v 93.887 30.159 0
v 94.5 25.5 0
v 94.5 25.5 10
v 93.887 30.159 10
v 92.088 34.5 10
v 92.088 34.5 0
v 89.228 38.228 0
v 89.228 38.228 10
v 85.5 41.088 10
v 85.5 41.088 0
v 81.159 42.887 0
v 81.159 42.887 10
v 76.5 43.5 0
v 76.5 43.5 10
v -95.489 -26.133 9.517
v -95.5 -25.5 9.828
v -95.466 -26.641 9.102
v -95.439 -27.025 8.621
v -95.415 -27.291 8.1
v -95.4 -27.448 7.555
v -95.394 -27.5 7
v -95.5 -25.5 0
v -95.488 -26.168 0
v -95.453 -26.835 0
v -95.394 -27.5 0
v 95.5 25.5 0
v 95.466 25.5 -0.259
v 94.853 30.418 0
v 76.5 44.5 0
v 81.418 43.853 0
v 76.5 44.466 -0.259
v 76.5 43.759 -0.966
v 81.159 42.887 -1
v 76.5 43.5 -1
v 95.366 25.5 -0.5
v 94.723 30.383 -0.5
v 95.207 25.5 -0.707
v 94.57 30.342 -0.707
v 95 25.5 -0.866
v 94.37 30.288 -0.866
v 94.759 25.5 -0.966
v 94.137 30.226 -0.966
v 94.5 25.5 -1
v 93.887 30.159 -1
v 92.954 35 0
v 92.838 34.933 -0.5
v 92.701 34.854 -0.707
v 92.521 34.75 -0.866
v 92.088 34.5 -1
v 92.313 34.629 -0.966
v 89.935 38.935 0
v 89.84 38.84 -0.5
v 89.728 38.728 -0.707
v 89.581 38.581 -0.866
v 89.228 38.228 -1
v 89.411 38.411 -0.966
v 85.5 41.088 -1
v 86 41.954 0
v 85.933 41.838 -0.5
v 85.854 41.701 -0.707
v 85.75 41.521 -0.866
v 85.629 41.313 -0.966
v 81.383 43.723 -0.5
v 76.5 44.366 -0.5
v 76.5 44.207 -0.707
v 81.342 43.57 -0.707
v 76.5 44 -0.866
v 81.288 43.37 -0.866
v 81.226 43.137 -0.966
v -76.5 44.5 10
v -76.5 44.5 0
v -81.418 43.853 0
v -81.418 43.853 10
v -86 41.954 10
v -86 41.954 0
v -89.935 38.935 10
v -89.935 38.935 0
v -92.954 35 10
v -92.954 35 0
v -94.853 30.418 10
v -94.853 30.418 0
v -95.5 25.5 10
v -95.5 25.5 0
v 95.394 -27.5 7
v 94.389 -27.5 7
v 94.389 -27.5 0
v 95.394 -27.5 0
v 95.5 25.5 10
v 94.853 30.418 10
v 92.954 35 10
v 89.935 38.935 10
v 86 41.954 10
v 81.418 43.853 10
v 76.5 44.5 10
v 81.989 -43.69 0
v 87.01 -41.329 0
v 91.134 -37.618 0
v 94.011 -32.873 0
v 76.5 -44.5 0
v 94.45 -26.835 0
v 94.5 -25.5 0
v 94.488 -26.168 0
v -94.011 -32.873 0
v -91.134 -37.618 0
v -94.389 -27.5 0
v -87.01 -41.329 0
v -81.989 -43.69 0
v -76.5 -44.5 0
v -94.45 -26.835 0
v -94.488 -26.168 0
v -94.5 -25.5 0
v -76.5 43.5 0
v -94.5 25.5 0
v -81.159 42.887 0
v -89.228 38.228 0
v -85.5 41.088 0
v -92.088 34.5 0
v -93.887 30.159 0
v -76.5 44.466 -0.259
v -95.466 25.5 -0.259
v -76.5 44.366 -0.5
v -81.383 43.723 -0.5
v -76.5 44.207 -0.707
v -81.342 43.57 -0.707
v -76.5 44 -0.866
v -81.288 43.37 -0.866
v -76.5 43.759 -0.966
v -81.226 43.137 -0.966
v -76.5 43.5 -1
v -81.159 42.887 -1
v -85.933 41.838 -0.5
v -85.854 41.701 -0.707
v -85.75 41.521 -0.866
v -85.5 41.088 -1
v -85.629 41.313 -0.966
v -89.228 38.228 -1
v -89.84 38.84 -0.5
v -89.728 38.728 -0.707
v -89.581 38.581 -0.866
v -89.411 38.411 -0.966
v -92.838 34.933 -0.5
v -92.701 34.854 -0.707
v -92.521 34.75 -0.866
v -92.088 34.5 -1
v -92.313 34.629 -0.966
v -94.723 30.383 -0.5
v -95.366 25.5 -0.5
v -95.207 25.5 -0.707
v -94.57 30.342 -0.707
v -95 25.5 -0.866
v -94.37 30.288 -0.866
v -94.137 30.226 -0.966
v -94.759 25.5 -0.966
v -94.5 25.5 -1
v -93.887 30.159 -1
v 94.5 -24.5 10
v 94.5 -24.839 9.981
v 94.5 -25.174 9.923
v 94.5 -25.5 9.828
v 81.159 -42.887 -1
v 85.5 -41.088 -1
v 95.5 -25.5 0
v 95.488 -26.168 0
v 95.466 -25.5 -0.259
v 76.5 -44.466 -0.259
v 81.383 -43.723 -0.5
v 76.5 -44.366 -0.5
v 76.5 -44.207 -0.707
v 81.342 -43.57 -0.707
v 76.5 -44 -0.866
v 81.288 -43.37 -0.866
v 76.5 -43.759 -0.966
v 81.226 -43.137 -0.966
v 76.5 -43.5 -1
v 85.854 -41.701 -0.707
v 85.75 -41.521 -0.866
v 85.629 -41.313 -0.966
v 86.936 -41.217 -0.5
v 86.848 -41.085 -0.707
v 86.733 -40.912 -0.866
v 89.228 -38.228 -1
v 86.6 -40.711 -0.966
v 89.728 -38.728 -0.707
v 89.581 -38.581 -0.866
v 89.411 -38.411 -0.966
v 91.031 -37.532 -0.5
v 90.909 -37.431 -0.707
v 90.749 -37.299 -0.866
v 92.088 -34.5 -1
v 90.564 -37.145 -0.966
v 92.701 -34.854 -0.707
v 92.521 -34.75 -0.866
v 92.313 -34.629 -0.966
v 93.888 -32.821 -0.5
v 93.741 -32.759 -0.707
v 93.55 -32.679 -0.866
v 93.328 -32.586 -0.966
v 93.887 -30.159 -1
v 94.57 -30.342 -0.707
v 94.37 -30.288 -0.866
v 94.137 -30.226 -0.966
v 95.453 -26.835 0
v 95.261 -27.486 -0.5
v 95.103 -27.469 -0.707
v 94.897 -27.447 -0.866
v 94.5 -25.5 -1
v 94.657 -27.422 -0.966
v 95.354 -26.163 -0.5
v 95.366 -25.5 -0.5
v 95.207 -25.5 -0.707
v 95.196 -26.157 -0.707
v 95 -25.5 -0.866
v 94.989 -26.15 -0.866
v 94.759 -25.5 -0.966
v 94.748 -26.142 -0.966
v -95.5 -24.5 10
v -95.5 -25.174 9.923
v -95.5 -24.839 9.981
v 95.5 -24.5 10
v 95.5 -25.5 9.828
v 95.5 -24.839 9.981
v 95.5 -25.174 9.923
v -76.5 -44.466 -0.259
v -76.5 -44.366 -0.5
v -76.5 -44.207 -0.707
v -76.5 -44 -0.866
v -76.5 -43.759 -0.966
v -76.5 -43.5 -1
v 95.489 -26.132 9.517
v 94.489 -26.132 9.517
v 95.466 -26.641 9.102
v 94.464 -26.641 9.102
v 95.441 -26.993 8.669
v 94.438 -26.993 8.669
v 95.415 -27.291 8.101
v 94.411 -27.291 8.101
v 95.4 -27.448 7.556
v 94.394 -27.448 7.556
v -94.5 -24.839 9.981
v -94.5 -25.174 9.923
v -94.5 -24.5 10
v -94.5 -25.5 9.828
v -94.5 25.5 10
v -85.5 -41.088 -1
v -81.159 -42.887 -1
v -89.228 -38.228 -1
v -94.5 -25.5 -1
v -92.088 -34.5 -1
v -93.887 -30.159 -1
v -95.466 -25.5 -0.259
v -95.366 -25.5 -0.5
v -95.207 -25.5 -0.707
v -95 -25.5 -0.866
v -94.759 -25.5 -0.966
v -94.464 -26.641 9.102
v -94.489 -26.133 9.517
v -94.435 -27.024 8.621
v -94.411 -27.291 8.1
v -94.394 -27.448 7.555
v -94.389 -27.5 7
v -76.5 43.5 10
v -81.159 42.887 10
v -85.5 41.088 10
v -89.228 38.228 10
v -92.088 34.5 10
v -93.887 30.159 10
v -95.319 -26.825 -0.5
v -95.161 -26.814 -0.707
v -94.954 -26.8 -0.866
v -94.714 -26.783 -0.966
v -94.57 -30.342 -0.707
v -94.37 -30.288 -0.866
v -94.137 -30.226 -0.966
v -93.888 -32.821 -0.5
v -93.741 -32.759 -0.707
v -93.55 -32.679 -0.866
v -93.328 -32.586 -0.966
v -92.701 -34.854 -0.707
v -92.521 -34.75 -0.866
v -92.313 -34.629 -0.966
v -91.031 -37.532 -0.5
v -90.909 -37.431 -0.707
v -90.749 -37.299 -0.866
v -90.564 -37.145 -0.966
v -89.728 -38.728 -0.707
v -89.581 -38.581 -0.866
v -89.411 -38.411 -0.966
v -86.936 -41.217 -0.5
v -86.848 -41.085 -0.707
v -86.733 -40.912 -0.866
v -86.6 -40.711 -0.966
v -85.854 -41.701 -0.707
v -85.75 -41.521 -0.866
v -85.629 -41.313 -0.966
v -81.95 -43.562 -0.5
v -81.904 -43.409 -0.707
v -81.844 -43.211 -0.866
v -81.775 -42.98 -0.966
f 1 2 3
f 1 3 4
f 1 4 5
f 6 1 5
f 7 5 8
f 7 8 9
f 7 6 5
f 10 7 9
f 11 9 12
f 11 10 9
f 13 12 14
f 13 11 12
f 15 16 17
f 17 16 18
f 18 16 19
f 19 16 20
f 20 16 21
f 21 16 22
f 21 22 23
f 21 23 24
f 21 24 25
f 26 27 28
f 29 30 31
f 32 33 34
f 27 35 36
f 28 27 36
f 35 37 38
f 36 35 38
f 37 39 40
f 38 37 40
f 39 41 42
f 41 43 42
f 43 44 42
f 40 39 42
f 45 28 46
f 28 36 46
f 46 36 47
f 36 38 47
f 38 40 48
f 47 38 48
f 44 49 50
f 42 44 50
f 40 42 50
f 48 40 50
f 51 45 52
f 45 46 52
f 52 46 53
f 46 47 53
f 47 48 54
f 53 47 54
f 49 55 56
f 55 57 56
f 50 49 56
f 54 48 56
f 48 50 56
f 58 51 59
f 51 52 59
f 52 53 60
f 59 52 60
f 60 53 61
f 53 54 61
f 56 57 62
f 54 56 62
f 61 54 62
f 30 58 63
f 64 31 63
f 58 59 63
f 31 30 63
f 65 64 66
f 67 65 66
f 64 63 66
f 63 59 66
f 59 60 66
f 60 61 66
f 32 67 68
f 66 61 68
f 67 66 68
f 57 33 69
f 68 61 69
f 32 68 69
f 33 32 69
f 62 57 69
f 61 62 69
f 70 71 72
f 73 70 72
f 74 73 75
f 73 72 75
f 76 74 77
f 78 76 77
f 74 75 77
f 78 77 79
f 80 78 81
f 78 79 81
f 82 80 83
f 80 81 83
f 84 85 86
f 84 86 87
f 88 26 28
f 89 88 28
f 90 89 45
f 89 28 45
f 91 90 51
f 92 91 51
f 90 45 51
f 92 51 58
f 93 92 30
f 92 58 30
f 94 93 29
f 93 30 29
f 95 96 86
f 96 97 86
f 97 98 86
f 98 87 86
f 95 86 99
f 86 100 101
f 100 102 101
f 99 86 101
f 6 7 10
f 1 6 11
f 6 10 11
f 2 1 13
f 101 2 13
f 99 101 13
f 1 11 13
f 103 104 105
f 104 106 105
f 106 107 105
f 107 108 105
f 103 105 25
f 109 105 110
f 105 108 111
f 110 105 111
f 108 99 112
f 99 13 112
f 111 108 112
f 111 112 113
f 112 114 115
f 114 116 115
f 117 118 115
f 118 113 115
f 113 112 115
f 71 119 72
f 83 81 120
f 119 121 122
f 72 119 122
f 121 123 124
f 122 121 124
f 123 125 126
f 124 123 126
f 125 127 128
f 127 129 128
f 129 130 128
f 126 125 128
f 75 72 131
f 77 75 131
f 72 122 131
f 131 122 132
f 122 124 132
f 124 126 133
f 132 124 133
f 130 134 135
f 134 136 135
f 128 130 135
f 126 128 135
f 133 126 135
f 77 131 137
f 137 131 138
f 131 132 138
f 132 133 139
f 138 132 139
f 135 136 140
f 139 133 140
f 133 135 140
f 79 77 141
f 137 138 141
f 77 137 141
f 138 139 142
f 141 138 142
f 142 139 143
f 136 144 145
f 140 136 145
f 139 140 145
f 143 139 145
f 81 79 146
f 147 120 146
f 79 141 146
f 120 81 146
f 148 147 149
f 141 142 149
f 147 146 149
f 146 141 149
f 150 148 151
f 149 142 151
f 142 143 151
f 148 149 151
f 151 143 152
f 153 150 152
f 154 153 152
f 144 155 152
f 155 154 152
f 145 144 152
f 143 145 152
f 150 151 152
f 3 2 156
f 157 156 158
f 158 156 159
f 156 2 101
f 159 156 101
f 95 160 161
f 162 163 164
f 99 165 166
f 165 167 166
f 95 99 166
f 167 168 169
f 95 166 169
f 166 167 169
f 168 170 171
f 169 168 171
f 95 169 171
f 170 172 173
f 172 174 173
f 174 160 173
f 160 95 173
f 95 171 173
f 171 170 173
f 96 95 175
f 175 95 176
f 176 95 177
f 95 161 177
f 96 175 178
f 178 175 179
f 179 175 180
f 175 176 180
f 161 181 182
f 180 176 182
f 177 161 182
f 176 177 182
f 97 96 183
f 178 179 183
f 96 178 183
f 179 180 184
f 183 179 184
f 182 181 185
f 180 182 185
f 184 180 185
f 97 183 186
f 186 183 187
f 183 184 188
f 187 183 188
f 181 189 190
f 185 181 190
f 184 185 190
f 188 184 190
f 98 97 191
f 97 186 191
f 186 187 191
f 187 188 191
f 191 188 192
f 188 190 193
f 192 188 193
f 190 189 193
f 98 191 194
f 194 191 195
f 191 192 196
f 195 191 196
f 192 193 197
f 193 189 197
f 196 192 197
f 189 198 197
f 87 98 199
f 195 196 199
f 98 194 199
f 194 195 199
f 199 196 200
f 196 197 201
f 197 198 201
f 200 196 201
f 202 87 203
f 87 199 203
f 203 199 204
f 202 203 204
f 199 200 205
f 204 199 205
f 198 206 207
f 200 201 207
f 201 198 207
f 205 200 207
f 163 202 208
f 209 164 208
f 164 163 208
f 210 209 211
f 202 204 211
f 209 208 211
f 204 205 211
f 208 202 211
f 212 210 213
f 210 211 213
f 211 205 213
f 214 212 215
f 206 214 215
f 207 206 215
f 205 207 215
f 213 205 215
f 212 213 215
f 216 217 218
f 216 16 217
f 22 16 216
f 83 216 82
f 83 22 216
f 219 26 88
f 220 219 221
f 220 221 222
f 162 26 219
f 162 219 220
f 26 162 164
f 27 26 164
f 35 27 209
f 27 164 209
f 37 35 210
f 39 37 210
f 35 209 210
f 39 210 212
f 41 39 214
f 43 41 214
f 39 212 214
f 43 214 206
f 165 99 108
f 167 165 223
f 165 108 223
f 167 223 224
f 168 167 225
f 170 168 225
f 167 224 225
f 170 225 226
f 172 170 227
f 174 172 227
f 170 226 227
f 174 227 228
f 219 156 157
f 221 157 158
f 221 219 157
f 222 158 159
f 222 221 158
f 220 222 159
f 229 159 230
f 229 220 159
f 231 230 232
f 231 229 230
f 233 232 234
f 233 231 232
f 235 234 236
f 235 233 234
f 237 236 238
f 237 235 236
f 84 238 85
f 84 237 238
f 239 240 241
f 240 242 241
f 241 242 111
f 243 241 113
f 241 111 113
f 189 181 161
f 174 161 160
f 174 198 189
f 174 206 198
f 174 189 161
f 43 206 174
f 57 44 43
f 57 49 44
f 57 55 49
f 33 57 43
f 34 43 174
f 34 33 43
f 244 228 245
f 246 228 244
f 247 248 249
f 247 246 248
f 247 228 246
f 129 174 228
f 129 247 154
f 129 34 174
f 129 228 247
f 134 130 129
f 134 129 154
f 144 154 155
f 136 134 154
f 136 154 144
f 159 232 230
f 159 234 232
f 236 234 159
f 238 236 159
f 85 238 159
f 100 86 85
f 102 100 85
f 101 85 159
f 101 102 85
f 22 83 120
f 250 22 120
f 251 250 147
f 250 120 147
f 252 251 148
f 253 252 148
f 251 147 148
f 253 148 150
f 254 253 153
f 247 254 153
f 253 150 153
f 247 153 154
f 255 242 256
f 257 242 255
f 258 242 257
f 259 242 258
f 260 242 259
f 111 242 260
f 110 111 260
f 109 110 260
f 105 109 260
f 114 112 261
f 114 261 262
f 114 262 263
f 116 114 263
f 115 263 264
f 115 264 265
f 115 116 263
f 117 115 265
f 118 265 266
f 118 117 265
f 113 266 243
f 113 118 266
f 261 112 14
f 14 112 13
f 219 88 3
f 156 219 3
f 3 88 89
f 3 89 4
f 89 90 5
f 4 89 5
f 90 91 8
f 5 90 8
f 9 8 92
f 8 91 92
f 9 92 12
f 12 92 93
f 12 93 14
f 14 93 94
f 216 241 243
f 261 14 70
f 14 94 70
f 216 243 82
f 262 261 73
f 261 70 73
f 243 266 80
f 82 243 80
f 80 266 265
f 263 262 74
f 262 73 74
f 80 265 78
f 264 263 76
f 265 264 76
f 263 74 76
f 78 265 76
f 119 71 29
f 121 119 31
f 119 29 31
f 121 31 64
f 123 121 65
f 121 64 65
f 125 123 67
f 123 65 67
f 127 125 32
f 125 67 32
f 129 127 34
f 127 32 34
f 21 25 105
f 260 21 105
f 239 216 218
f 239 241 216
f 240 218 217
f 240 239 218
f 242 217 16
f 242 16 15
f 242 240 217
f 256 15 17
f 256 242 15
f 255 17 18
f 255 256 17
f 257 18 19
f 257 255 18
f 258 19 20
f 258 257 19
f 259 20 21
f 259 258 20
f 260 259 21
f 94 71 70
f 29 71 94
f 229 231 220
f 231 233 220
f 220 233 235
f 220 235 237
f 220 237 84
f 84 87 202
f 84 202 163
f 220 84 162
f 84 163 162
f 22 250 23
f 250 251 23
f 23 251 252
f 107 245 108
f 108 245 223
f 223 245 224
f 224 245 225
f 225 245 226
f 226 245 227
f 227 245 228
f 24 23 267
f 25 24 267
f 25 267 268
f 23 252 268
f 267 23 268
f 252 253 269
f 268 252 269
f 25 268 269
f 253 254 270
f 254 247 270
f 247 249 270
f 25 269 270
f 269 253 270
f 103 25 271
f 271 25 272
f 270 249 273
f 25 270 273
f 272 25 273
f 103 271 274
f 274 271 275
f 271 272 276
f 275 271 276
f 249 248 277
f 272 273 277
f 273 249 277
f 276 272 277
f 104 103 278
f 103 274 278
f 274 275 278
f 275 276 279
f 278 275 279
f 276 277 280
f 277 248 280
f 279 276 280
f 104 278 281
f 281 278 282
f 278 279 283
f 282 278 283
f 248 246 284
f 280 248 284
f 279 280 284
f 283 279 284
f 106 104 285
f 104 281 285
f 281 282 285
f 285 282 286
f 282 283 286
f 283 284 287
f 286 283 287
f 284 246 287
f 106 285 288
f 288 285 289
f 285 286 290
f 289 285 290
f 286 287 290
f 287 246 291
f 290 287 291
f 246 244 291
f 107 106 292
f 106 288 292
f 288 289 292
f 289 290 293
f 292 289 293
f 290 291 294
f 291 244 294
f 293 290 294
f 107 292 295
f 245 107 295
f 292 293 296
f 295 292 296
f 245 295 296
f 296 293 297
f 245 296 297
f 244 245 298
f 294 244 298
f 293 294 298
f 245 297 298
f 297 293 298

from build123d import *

# Parameters (mm, degrees)
PAD_DEPTH         = 10
THICKNESS_T       = 1
SKETCH001_W       = 15
SKETCH001_H       = 10
SKETCH001_W_2     = 143
POCKET_DEPTH      = 5
POCKET_DEPTH_BACK = -5
SKETCH002_W       = 191
SKETCH002_H       = 10
POCKET001_DEPTH   = 17
FILLET_R          = 3


with BuildPart() as part:
    # Sketch → Pad (new body)
    with BuildSketch(Plane.XY):
        with BuildLine():
            Line((-76.5, 43.5), (76.5, 43.5))
            ThreePointArc((94.5, 25.5), (89.227922, 38.227922), (76.5, 43.5))
            Line((94.5, 25.5), (94.5, -25.5))
            ThreePointArc((76.5, -43.5), (89.227922, -38.227922), (94.5, -25.5))
            Line((76.5, -43.5), (-76.5, -43.5))
            ThreePointArc((-94.5, -25.5), (-89.227922, -38.227922), (-76.5, -43.5))
            Line((-94.5, -25.5), (-94.5, 25.5))
            ThreePointArc((-76.5, 43.5), (-89.227922, 38.227922), (-94.5, 25.5))
        make_face()
    extrude(amount=PAD_DEPTH)

    # Thickness
    thickness_openings = [part.faces().sort_by_distance(p)[0] for p in [
        (0, 0, 10),
    ]]
    offset(amount=THICKNESS_T, openings=thickness_openings)

    # Sketch001 (on Face5 of Thickness) → Pocket (cut, two sides)
    with BuildSketch(Plane(origin=(0, -43.5, 0), x_dir=(-1, 0, 0), z_dir=(0, 1, 0))) as pocket_sk:
        with Locations((79, 5)):
            Rectangle(SKETCH001_W, SKETCH001_H)
        with Locations((-79, 5)):
            Rectangle(SKETCH001_W, SKETCH001_H)
        with Locations((0, 5)):
            Rectangle(SKETCH001_W_2, SKETCH001_H)
    extrude(amount=-POCKET_DEPTH, mode=Mode.SUBTRACT)
    extrude(pocket_sk.sketch, amount=-POCKET_DEPTH_BACK, mode=Mode.SUBTRACT)

    # Sketch002 (on Face15 of Thickness) → Pocket001 (cut)
    with BuildSketch(Plane.XZ.offset(44.5)):
        with Locations((0, 5)):
            Rectangle(SKETCH002_W, SKETCH002_H)
    extrude(amount=-POCKET001_DEPTH, mode=Mode.SUBTRACT)

    # Fillet
    fillet_edges = [part.edges().sort_by_distance(p)[0] for p in [
        (-94.891494, -27.5, 10),
        (94.891494, -27.5, 10),
    ]]
    fillet(fillet_edges, radius=FILLET_R)


solid = part.part
